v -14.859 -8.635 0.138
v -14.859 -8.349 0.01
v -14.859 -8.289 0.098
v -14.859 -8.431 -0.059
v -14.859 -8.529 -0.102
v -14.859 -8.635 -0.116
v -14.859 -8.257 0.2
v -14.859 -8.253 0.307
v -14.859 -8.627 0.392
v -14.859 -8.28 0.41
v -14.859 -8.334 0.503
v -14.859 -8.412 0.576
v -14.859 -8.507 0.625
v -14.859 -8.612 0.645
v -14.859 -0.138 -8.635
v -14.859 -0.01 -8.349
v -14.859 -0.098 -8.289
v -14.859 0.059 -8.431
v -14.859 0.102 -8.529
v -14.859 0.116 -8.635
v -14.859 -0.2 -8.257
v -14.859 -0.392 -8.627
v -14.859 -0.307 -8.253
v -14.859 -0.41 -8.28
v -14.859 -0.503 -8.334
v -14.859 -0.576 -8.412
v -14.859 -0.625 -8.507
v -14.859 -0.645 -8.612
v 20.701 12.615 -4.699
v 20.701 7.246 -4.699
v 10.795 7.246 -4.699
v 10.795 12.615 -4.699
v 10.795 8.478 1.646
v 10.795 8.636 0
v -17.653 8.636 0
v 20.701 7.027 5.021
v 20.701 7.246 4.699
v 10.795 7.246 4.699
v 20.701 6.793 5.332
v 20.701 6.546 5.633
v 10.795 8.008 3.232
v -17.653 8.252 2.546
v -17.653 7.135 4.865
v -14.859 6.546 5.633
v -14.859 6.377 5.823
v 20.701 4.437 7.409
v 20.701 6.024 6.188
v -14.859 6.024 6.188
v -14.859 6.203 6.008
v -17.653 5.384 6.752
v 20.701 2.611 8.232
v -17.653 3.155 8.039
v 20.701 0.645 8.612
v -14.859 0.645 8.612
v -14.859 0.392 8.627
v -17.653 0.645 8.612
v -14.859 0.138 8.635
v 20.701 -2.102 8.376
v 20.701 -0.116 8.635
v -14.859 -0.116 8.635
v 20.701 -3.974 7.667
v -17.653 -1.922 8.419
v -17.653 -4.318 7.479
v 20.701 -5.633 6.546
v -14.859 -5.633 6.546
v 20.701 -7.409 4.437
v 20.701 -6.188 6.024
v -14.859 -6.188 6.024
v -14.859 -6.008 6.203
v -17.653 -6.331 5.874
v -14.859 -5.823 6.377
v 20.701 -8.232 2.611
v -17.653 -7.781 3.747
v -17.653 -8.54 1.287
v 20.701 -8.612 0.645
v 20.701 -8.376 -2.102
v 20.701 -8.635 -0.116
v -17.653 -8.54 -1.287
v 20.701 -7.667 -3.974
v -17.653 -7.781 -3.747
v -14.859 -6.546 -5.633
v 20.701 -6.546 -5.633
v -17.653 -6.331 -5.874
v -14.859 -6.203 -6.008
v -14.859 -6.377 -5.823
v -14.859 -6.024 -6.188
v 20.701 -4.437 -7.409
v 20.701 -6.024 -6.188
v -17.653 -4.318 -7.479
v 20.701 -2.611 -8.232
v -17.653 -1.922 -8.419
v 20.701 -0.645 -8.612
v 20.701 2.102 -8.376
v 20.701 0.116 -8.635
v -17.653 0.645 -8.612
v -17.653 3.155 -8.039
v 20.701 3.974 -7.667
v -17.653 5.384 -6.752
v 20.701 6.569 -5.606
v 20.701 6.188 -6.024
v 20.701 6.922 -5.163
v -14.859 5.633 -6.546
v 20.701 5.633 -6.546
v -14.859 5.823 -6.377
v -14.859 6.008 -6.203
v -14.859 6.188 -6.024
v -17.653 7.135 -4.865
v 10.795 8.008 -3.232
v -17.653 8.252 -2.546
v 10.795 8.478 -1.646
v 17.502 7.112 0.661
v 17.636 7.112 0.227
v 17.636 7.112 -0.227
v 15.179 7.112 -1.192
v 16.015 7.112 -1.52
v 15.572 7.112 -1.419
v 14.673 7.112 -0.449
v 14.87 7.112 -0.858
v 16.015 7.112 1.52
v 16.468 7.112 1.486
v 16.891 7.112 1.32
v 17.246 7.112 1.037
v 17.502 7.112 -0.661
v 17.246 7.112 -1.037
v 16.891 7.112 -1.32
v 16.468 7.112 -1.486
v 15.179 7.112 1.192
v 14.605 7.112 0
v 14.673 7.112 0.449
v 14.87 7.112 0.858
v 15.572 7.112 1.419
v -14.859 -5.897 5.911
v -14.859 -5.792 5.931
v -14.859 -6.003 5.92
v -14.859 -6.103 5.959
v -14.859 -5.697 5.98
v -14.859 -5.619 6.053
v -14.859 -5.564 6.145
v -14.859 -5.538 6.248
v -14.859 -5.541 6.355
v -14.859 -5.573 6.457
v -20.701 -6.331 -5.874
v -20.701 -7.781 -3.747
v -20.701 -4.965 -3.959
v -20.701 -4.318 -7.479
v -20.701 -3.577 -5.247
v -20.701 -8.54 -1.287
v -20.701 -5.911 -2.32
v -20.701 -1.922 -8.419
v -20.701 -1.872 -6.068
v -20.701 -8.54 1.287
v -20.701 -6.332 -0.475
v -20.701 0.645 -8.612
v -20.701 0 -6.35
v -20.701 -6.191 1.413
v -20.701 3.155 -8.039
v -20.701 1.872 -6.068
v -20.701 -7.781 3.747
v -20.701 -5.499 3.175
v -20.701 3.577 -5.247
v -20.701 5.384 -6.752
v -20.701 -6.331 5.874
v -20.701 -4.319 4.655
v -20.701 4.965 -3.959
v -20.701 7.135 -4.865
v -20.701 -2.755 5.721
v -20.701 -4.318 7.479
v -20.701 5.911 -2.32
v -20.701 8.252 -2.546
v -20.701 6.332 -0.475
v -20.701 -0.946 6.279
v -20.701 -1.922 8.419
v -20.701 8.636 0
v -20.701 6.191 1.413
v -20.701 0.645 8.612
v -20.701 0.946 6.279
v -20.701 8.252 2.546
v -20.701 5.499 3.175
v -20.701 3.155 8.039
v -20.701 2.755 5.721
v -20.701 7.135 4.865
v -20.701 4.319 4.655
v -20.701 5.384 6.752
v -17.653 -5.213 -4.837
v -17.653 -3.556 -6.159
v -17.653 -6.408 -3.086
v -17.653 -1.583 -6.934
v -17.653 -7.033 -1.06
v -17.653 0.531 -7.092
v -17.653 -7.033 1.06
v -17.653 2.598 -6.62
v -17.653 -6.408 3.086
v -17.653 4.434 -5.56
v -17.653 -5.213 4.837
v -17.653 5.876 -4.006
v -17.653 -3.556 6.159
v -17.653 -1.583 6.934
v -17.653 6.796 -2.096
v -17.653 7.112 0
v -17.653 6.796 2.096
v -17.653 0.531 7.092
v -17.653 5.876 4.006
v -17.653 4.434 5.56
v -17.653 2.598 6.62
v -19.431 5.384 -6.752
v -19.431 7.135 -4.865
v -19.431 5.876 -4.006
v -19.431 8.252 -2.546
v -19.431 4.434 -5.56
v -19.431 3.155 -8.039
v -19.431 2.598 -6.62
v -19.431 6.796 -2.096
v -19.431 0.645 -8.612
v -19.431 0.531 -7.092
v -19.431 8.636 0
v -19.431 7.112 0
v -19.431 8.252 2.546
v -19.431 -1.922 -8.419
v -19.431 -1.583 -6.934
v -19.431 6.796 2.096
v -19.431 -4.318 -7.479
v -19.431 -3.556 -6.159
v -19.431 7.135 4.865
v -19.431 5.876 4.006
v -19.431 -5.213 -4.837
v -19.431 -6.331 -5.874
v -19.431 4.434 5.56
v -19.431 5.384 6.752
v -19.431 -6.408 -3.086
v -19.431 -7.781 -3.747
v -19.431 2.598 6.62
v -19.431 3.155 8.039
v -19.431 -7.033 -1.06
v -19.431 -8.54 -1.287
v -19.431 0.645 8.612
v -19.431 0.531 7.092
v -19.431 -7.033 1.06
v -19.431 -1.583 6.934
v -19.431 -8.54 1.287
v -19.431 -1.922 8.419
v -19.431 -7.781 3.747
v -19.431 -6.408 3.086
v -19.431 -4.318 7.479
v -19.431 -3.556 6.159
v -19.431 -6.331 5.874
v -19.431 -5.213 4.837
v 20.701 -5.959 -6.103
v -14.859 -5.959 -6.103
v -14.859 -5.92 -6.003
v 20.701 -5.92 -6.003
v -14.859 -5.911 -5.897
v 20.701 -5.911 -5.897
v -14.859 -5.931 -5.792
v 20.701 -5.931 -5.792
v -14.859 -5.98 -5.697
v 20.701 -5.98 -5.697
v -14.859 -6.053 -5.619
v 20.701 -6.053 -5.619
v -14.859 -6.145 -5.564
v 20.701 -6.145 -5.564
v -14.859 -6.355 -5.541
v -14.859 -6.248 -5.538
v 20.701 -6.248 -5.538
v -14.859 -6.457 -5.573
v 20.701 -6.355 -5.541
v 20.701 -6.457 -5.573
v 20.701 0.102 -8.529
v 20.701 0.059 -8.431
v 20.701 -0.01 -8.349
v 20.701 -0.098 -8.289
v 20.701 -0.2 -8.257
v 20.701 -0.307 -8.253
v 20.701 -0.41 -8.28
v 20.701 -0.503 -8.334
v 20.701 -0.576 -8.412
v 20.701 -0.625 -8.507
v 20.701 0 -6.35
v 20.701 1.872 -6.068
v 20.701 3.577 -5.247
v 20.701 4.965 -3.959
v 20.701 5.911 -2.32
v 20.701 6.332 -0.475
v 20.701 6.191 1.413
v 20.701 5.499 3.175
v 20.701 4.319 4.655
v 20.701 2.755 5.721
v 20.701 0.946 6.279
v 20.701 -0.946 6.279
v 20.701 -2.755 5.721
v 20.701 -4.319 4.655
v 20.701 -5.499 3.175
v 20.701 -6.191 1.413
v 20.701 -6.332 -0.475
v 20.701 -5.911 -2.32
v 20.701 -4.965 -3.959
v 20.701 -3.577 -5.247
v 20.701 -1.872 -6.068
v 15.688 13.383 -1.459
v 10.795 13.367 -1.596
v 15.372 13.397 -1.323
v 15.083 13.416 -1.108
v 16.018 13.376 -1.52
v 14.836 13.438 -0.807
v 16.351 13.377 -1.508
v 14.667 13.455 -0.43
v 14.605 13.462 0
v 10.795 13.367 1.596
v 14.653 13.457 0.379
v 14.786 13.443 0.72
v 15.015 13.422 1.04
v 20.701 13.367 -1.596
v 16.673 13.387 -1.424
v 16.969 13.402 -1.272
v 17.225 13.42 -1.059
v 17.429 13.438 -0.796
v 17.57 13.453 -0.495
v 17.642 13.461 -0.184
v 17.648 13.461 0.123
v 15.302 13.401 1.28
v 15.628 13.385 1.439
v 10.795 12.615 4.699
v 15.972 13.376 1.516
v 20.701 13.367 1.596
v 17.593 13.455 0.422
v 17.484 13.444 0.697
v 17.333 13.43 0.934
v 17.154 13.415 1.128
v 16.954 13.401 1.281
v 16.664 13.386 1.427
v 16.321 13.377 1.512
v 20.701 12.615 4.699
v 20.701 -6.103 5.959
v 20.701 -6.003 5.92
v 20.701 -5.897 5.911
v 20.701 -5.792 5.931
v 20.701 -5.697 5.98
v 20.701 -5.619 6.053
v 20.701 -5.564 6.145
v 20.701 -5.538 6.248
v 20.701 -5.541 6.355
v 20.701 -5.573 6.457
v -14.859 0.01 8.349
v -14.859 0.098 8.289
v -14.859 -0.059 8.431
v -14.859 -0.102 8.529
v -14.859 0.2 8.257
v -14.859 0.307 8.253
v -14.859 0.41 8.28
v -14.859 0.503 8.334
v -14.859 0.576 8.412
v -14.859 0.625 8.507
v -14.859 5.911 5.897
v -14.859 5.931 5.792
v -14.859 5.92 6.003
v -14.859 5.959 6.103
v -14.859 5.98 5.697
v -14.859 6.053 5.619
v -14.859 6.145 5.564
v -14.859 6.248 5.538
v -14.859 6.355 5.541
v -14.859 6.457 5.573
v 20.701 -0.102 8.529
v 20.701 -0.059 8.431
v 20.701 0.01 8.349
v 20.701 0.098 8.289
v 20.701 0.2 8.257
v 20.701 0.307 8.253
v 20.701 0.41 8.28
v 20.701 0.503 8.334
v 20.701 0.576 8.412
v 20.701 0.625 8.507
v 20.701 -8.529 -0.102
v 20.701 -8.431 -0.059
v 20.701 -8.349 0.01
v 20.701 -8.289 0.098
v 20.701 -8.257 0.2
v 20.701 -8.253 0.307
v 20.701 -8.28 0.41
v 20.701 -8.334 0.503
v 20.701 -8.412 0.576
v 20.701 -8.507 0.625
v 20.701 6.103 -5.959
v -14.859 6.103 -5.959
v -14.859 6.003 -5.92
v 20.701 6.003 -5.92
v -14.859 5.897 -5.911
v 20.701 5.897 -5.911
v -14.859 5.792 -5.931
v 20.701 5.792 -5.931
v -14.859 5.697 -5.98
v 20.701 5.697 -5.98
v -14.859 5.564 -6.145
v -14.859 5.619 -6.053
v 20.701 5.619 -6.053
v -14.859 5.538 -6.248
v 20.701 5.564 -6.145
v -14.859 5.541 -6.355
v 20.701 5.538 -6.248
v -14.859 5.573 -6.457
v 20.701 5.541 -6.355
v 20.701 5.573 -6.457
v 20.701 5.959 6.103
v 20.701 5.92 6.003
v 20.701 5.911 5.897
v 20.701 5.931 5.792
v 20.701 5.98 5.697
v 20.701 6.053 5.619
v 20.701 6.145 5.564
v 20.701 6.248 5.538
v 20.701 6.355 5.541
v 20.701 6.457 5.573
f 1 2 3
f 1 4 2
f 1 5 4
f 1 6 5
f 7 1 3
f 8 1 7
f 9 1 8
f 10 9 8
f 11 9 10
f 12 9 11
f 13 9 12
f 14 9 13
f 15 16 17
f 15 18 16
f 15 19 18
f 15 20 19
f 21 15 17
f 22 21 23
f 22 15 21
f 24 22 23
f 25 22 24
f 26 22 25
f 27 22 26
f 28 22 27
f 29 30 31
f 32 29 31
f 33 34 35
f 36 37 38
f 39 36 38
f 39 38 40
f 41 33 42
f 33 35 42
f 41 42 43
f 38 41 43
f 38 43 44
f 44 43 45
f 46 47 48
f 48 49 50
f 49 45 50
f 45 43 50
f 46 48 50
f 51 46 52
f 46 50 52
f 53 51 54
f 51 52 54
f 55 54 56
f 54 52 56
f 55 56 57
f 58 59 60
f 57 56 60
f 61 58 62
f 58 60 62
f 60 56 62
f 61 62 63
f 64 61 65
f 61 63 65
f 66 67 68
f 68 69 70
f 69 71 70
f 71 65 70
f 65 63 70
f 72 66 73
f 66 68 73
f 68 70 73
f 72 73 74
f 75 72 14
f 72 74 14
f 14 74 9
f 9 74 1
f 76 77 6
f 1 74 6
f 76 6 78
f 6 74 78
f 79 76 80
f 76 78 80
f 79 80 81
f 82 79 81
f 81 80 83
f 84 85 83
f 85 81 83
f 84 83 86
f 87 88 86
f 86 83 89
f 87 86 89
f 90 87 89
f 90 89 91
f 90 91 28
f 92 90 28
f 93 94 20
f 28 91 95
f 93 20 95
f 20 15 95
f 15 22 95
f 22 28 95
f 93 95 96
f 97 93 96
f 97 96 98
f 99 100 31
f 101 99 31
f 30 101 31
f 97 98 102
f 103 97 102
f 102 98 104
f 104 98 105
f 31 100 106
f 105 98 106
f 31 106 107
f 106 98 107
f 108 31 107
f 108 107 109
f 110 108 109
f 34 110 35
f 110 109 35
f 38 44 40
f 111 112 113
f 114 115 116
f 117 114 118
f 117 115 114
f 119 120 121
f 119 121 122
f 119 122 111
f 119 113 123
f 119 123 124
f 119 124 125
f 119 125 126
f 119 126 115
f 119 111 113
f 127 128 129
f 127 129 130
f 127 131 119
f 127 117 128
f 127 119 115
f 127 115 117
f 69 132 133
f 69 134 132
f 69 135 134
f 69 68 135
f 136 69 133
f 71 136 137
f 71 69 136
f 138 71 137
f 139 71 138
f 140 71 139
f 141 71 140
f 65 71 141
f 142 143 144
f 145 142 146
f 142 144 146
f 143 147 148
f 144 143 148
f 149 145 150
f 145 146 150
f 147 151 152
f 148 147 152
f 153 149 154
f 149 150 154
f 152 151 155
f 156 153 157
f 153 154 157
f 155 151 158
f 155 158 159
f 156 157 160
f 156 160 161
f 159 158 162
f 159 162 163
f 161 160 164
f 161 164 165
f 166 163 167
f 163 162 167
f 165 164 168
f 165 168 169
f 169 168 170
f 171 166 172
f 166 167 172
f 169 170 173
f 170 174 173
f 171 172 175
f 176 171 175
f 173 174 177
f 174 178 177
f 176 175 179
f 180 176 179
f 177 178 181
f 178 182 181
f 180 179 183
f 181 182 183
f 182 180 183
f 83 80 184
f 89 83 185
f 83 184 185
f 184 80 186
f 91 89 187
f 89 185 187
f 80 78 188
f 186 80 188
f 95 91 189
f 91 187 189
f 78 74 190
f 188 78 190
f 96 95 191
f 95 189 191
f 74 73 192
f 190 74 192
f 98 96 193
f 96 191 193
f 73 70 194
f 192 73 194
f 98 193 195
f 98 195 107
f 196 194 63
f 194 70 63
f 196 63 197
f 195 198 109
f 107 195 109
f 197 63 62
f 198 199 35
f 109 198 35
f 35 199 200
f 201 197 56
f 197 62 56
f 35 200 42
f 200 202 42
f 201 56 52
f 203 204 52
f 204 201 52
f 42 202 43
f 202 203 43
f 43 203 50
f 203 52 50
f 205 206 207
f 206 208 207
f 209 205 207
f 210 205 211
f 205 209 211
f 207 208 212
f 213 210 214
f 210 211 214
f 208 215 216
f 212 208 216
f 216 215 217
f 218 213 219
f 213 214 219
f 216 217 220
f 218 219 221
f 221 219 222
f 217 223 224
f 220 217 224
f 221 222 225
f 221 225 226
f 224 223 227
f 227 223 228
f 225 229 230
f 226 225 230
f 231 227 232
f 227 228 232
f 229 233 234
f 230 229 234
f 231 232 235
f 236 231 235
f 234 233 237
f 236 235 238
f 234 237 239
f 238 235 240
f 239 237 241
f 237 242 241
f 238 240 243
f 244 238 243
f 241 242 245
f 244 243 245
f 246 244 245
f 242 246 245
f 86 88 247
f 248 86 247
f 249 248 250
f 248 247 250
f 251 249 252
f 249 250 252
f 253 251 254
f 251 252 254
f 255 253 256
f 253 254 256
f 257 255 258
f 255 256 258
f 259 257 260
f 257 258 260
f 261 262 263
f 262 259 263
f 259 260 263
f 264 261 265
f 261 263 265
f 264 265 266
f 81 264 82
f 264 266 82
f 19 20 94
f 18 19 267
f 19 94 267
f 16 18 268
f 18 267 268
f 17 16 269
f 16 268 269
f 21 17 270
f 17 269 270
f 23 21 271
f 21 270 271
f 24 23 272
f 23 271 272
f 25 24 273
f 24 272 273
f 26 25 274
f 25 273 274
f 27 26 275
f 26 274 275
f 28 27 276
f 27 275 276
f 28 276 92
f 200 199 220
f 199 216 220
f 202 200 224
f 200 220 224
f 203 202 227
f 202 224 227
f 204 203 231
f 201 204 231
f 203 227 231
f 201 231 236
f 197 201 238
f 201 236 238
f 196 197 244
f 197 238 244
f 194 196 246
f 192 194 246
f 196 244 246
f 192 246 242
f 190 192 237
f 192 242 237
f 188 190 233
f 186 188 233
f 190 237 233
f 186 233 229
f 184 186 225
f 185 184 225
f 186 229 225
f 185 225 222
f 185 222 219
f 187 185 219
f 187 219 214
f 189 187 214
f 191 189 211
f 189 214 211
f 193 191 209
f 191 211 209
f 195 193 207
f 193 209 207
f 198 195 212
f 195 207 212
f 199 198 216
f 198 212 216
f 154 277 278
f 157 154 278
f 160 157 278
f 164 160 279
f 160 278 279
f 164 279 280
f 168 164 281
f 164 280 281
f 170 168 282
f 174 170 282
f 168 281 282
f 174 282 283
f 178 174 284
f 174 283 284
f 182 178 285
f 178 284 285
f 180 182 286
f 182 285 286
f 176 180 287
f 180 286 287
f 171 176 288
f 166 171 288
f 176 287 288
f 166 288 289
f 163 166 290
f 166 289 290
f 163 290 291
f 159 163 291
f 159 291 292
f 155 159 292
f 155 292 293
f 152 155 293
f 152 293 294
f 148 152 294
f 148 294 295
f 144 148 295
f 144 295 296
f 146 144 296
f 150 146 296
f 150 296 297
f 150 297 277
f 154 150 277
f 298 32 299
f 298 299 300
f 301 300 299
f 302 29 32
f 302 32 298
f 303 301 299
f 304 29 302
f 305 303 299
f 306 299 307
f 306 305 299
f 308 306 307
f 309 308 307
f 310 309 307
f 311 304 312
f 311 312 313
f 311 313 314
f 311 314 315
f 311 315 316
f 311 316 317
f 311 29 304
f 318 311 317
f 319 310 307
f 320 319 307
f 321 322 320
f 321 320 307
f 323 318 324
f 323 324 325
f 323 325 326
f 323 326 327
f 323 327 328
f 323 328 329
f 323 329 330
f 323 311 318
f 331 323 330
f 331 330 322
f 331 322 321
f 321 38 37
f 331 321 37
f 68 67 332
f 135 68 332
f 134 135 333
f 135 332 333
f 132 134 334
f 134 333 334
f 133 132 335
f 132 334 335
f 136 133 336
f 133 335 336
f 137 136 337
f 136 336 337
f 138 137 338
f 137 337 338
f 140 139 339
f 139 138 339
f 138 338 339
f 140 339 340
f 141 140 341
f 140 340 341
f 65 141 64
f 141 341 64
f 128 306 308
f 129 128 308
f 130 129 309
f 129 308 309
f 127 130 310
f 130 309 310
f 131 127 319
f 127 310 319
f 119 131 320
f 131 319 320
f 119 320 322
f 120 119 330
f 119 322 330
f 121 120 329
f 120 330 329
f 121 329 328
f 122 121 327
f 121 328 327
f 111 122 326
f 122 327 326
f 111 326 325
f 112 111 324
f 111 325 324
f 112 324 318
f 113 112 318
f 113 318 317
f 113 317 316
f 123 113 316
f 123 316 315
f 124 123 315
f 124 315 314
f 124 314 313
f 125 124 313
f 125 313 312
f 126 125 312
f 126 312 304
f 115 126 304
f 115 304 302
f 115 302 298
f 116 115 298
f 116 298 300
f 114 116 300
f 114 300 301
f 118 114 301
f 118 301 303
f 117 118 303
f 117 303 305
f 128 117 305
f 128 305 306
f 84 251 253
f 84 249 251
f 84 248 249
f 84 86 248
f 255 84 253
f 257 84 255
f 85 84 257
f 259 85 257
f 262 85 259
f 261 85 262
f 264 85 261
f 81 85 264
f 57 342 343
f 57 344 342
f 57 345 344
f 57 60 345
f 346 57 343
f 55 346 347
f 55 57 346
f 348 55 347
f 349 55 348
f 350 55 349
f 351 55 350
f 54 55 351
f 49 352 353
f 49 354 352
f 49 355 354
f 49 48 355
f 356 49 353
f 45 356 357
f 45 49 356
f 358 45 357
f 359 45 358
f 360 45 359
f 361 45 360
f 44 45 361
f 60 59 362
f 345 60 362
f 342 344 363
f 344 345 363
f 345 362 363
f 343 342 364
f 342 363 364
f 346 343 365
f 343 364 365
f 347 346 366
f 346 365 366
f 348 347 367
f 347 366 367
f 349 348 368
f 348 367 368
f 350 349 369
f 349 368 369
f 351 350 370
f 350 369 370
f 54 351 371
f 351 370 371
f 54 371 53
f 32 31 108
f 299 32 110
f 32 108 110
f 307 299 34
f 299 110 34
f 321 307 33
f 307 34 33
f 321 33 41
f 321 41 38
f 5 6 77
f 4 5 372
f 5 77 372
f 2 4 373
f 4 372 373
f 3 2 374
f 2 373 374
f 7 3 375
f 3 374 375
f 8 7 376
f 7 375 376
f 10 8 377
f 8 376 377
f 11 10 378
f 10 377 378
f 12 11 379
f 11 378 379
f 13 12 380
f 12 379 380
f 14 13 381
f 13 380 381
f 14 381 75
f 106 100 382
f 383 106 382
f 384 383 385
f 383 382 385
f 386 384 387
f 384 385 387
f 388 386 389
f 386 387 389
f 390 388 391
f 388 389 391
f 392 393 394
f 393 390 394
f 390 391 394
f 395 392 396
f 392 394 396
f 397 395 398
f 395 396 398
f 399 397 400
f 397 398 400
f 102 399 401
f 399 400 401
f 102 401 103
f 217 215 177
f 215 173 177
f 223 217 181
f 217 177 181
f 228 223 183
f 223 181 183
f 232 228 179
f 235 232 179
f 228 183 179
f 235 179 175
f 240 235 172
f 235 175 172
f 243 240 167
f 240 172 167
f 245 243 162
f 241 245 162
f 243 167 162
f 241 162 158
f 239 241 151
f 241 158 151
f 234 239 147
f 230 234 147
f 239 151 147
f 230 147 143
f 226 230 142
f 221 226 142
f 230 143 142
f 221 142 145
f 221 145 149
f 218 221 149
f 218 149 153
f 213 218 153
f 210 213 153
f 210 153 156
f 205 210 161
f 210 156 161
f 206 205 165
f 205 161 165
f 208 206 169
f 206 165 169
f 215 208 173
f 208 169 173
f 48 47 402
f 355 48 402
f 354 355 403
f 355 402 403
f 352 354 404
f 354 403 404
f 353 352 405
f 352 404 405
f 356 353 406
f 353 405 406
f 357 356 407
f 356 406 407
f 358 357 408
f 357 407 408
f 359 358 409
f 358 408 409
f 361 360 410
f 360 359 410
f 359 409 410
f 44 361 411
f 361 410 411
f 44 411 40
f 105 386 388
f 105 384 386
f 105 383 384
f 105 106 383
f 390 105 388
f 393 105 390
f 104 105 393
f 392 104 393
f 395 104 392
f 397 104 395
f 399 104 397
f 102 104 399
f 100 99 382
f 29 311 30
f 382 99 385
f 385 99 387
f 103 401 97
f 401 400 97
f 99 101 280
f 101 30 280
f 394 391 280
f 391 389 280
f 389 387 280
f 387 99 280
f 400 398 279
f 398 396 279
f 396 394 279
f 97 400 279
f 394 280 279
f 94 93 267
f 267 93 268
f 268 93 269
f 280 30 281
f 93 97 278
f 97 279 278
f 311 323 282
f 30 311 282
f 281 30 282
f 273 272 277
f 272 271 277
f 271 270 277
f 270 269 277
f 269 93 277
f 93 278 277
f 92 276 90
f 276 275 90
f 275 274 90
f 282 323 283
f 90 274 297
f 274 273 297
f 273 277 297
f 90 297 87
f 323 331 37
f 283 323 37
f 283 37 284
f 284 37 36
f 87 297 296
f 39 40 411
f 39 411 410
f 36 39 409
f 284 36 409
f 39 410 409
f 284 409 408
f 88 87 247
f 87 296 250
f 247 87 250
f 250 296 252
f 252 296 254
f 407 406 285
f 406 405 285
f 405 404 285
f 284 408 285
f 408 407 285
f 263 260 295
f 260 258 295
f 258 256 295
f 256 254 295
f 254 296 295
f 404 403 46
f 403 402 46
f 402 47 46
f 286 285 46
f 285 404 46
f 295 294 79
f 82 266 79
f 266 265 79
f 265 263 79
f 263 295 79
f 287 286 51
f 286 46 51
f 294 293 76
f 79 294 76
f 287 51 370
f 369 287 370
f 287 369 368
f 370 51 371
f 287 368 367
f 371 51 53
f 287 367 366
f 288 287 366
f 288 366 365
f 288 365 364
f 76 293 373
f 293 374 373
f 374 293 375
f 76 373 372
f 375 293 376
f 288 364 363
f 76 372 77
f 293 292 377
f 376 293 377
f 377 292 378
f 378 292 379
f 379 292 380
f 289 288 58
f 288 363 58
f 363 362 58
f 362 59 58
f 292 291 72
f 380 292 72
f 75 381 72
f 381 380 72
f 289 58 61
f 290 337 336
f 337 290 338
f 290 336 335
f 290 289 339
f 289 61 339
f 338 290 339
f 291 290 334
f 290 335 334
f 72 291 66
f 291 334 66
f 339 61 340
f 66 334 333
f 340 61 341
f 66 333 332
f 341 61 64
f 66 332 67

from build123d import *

# Parameters (mm, degrees)
BOSS_EXTRUDE1_DEPTH = 13.462
SKETCH7_OUTSIDE_W   = 29.274
SKETCH7_OUTSIDE_H   = 34.1
SKETCH7_OUTSIDE_R   = 13.462
CUT_EXTRUDE1_DEPTH  = 13.462
SKETCH8_R           = 1.524
CUT_EXTRUDE2_DEPTH  = 6.35
SKETCH9_R           = 6.35
CUT_EXTRUDE3_DEPTH  = 42.402
SKETCH10_R          = 0.381
CUT_EXTRUDE4_DEPTH  = 35.56
CIRPATTERN1_COUNT   = 8


with BuildPart() as part:
    # Sketch1 → Revolve1 (revolve)
    with BuildSketch(Plane.XY):
        Polygon((20.701, 0), (20.701, 8.636), (-17.653, 8.636), (-17.653, 7.112), (-19.431, 7.112), (-19.431, 8.636), (-20.701, 8.636), (-20.701, 0), align=None)
    revolve(axis=Axis((-78.241804248, 0, 0), (1, 0, 0)))

    # Sketch6 → Boss-Extrude1 (add)
    with BuildSketch(Plane(origin=(0, 0, 0), x_dir=(1, 0, 0), z_dir=(0, 1, 0))):
        Polygon((20.701, 0), (20.701, 4.699), (10.795, 4.699), (10.795, -4.699), (20.701, -4.699), align=None)
    extrude(amount=BOSS_EXTRUDE1_DEPTH)

    # Sketch7 outside → Cut-Extrude1 (cut)
    with BuildSketch(Plane(origin=(20.701, 0, 0), x_dir=(0, 0, -1), z_dir=(1, 0, 0))):
        with Locations((0, 2.413)):
            Rectangle(SKETCH7_OUTSIDE_W, SKETCH7_OUTSIDE_H)
        Circle(SKETCH7_OUTSIDE_R, mode=Mode.SUBTRACT)
    extrude(amount=-CUT_EXTRUDE1_DEPTH, mode=Mode.SUBTRACT)

    # Sketch8 → Cut-Extrude2 (cut)
    with BuildSketch(Plane(origin=(0, 13.462, 0), x_dir=(-1, 0, 0), z_dir=(0, 1, 0))):
        with Locations((-16.129, 0)):
            Circle(SKETCH8_R)
    extrude(amount=-CUT_EXTRUDE2_DEPTH, mode=Mode.SUBTRACT)

    # Sketch9 → Cut-Extrude3 (cut, through all)
    with BuildSketch(Plane(origin=(20.701, 0, 0), x_dir=(0, 0, -1), z_dir=(1, 0, 0))):
        Circle(SKETCH9_R)
    extrude(amount=-CUT_EXTRUDE3_DEPTH, mode=Mode.SUBTRACT)

    # Sketch10 → Cut-Extrude4 (cut)
    with BuildSketch(Plane(origin=(20.701, 0, 0), x_dir=(0, 0, -1), z_dir=(1, 0, 0))):
        with Locations((-5.916324211, 6.291073345)):
            Circle(SKETCH10_R)
    cut_extrude4 = extrude(amount=-CUT_EXTRUDE4_DEPTH, mode=Mode.SUBTRACT)

    # CirPattern1: Cut-Extrude4 ×8 about axis, 1 skipped
    cirpattern1_axis = Axis((20.701, 0, 0), (-1, 0, 0))
    add([cut_extrude4.rotate(cirpattern1_axis, i * 360 / CIRPATTERN1_COUNT) for i in range(1, CIRPATTERN1_COUNT) if i not in (1,)], mode=Mode.SUBTRACT)


solid = part.part
